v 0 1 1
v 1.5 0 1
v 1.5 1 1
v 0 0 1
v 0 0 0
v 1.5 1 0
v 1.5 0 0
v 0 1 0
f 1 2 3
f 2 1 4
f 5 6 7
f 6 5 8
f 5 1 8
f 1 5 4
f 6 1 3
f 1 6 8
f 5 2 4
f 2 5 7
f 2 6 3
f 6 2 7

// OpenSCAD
intersection() {
  union() {
    cube(1);
    translate([0.5, 0, 0])
      cube(1);
  }
  cube(10, center=1); // Just to ensure fast-union doesn't drop the union above we're trying to test
}
